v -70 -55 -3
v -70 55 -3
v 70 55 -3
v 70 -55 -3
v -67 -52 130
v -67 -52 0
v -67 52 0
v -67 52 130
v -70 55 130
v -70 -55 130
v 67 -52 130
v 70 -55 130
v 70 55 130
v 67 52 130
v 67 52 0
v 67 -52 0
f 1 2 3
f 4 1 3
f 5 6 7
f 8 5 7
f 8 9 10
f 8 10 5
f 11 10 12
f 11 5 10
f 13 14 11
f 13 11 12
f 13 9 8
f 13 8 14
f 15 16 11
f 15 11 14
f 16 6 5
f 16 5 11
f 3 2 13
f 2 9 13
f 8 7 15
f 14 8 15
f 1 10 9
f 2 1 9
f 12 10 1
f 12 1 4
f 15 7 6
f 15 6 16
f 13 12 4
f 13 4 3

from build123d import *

# Parameters (mm, degrees)
F0_W     = 140
F0_H     = 110
F0_W_2   = 134
F0_H_2   = 104
F1_DEPTH = 130
F2_W     = 140
F2_H     = 110
F3_DEPTH = 3


with BuildPart() as f1:
    # F0 (on Top) → F1 (new body)
    with BuildSketch(Plane.XY):
        Rectangle(F0_W, F0_H)
        Rectangle(F0_W_2, F0_H_2, mode=Mode.SUBTRACT)
    extrude(amount=F1_DEPTH)

    # F2 (on Top) → F3 (join)
    with BuildSketch(Plane.XY):
        Rectangle(F2_W, F2_H)
    extrude(amount=-F3_DEPTH)


solid = f1.part
